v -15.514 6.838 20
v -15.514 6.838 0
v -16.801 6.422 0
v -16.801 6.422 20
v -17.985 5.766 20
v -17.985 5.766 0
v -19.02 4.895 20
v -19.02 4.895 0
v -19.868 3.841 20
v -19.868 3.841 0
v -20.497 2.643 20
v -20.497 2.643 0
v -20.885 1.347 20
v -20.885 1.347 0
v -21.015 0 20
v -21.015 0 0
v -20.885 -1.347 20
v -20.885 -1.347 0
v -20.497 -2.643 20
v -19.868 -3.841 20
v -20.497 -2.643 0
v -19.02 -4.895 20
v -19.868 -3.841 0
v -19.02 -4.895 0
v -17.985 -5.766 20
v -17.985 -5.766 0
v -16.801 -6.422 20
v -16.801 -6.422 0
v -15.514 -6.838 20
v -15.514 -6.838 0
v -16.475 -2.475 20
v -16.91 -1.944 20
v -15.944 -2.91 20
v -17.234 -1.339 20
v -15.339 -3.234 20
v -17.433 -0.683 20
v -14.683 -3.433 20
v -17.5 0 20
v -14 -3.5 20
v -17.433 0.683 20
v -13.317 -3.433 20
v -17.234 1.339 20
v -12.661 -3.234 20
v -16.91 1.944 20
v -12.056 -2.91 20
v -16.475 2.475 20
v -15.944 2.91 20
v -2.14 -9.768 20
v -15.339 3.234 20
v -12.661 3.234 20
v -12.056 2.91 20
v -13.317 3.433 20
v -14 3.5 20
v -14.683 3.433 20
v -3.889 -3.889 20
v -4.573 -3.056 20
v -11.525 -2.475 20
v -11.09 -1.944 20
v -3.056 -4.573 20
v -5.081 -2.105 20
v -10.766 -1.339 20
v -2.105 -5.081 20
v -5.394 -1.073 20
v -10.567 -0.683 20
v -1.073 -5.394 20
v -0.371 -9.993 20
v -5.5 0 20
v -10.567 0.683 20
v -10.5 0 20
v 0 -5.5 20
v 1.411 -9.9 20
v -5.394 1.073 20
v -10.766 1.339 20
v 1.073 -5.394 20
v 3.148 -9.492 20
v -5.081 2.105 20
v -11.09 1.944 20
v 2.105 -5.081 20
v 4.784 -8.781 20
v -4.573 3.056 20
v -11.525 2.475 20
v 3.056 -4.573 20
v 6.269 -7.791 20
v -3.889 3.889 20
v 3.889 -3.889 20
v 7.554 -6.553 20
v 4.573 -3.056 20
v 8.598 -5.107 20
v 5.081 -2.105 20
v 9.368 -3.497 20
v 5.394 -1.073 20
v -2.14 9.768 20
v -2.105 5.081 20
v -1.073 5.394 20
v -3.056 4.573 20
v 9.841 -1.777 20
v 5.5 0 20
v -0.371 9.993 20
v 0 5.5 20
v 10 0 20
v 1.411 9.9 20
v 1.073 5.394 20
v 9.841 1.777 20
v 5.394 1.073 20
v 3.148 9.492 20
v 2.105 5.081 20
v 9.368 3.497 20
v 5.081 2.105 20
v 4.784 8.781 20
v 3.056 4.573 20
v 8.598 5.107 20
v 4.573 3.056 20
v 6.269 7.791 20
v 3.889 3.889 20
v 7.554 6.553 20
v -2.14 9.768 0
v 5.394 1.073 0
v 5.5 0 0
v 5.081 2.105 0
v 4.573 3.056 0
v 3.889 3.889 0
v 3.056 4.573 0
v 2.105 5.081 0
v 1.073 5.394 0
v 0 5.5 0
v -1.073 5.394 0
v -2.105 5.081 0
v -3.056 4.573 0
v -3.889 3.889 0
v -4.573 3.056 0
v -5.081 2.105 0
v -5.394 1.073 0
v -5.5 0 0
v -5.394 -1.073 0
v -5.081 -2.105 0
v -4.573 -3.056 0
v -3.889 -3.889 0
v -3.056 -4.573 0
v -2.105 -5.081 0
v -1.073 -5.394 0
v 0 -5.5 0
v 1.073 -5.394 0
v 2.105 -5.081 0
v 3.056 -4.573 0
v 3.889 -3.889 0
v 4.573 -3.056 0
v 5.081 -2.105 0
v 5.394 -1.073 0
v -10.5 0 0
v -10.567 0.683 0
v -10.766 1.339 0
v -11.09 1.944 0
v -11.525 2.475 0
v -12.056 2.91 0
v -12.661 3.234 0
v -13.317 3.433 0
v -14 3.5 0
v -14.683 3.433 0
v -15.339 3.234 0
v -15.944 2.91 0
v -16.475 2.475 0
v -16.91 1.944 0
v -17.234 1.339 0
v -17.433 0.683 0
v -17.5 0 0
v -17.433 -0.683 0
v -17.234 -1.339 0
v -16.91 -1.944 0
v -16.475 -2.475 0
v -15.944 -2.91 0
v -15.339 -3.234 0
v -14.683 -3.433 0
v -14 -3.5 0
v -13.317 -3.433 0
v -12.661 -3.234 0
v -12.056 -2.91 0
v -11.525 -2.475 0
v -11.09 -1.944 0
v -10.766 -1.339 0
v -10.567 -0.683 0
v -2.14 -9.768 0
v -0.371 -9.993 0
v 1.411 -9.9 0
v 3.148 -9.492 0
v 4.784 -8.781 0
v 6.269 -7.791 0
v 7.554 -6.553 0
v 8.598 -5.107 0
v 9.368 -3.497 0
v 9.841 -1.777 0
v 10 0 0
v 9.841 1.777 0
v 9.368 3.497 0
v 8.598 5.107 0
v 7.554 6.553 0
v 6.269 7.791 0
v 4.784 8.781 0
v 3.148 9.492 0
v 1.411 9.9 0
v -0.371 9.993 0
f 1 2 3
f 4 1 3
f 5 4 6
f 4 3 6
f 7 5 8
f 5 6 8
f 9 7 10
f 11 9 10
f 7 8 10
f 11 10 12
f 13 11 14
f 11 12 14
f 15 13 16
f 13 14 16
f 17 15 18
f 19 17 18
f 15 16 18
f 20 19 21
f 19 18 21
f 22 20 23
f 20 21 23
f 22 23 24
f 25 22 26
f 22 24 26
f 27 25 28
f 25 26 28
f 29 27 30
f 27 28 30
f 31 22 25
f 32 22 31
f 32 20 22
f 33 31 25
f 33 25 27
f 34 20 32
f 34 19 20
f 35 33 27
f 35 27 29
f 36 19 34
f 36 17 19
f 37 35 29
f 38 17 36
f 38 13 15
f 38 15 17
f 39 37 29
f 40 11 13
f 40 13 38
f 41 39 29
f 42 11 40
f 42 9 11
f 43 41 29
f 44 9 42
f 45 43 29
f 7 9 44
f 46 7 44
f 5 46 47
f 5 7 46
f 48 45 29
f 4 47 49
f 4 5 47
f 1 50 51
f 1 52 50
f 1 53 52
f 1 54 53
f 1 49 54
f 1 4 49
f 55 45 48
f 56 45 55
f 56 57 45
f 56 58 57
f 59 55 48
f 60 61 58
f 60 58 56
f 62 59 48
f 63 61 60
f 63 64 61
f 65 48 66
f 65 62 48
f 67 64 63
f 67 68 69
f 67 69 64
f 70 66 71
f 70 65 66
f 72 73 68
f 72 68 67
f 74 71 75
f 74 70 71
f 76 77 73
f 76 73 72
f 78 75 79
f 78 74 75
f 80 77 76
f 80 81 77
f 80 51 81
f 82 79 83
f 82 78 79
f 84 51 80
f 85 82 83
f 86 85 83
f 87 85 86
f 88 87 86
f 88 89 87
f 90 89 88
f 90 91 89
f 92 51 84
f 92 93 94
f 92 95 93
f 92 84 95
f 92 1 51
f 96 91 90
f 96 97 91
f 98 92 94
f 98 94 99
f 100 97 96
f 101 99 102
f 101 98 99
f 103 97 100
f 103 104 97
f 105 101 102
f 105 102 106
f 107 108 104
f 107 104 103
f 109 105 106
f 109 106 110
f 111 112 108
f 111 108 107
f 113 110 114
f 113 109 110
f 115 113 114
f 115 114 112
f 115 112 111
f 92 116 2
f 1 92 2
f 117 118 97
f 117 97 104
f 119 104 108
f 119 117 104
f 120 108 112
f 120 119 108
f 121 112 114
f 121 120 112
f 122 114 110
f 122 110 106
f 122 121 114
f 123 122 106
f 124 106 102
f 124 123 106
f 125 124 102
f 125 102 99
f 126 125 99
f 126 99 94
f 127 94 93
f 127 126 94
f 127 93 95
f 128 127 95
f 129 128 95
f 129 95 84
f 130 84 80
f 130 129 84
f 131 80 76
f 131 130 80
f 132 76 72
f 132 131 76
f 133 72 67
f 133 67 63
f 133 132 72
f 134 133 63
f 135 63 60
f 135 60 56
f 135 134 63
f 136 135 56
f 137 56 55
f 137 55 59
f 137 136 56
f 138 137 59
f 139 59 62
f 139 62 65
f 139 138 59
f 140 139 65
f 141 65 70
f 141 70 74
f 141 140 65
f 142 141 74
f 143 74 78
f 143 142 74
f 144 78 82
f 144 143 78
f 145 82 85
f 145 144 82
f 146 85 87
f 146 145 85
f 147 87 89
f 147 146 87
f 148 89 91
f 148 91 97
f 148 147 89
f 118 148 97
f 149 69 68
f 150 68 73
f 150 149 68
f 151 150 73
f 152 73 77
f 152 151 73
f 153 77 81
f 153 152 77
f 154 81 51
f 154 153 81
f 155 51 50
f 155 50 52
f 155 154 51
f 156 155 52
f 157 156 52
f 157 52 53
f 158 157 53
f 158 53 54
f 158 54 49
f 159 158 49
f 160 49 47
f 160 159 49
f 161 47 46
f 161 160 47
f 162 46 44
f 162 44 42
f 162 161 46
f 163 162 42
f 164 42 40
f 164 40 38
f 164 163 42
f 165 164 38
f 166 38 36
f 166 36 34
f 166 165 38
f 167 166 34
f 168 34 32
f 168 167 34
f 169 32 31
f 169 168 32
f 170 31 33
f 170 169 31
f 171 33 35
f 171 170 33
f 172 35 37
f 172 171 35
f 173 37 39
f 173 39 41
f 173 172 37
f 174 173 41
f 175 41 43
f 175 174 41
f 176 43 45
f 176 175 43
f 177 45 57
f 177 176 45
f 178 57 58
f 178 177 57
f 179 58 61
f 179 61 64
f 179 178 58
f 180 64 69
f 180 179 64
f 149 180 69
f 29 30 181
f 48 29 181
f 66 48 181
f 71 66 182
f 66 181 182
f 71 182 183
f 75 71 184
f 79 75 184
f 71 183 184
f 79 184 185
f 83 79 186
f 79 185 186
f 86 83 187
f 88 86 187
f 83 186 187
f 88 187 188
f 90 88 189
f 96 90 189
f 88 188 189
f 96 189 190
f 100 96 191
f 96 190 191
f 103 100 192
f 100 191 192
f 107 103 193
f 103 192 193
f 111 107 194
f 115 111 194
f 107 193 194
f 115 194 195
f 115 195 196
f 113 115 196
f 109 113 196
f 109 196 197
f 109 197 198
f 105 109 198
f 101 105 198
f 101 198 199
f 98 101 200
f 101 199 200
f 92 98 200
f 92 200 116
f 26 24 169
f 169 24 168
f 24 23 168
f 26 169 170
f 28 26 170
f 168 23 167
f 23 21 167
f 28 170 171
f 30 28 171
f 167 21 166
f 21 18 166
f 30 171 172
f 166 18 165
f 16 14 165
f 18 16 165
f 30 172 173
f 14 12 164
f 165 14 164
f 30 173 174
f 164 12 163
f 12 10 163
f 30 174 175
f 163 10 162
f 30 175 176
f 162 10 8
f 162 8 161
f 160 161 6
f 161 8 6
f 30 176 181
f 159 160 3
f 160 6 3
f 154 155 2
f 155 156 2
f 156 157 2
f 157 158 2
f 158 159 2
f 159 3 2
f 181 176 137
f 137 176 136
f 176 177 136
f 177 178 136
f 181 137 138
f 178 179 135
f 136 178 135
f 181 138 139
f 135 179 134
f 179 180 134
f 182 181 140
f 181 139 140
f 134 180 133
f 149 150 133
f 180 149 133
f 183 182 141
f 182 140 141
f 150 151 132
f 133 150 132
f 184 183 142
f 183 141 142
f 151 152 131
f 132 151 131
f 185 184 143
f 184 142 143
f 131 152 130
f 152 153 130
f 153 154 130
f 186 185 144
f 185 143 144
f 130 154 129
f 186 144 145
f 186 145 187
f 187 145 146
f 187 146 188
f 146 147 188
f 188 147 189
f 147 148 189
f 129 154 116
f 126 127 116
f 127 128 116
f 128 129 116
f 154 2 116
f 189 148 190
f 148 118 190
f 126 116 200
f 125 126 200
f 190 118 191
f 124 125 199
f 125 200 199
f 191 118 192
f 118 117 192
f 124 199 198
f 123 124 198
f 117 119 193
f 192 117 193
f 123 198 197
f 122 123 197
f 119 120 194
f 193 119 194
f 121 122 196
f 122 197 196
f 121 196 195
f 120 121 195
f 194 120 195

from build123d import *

# Parameters (mm, degrees)
F5_DEPTH = 20
F3_R     = 3.5
F6_DEPTH = 20
F1_R     = 5.5
F7_DEPTH = 20


with BuildPart() as f5:
    # F4 (on Top) → F5 (new body)
    with BuildSketch(Plane.XY):
        with BuildLine():
            Line((-15.51383, -6.837761), (-2.140489, -9.768229))
            ThreePointArc((-2.140489, -9.768229), (10, 0), (-2.140489, 9.768229))
            Line((-2.140489, 9.768229), (-15.51383, 6.837761))
            ThreePointArc((-15.51383, 6.837761), (-21.015487, 0), (-15.51383, -6.837761))
        make_face()
    extrude(amount=F5_DEPTH)

    # F3 (on Top) → F6 (cut)
    with BuildSketch(Plane.XY):
        with Locations((-14, 0)):
            Circle(F3_R)
    extrude(amount=F6_DEPTH, mode=Mode.SUBTRACT)

    # F1 (on Top) → F7 (cut)
    with BuildSketch(Plane.XY):
        Circle(F1_R)
    extrude(amount=F7_DEPTH, mode=Mode.SUBTRACT)


solid = f5.part
